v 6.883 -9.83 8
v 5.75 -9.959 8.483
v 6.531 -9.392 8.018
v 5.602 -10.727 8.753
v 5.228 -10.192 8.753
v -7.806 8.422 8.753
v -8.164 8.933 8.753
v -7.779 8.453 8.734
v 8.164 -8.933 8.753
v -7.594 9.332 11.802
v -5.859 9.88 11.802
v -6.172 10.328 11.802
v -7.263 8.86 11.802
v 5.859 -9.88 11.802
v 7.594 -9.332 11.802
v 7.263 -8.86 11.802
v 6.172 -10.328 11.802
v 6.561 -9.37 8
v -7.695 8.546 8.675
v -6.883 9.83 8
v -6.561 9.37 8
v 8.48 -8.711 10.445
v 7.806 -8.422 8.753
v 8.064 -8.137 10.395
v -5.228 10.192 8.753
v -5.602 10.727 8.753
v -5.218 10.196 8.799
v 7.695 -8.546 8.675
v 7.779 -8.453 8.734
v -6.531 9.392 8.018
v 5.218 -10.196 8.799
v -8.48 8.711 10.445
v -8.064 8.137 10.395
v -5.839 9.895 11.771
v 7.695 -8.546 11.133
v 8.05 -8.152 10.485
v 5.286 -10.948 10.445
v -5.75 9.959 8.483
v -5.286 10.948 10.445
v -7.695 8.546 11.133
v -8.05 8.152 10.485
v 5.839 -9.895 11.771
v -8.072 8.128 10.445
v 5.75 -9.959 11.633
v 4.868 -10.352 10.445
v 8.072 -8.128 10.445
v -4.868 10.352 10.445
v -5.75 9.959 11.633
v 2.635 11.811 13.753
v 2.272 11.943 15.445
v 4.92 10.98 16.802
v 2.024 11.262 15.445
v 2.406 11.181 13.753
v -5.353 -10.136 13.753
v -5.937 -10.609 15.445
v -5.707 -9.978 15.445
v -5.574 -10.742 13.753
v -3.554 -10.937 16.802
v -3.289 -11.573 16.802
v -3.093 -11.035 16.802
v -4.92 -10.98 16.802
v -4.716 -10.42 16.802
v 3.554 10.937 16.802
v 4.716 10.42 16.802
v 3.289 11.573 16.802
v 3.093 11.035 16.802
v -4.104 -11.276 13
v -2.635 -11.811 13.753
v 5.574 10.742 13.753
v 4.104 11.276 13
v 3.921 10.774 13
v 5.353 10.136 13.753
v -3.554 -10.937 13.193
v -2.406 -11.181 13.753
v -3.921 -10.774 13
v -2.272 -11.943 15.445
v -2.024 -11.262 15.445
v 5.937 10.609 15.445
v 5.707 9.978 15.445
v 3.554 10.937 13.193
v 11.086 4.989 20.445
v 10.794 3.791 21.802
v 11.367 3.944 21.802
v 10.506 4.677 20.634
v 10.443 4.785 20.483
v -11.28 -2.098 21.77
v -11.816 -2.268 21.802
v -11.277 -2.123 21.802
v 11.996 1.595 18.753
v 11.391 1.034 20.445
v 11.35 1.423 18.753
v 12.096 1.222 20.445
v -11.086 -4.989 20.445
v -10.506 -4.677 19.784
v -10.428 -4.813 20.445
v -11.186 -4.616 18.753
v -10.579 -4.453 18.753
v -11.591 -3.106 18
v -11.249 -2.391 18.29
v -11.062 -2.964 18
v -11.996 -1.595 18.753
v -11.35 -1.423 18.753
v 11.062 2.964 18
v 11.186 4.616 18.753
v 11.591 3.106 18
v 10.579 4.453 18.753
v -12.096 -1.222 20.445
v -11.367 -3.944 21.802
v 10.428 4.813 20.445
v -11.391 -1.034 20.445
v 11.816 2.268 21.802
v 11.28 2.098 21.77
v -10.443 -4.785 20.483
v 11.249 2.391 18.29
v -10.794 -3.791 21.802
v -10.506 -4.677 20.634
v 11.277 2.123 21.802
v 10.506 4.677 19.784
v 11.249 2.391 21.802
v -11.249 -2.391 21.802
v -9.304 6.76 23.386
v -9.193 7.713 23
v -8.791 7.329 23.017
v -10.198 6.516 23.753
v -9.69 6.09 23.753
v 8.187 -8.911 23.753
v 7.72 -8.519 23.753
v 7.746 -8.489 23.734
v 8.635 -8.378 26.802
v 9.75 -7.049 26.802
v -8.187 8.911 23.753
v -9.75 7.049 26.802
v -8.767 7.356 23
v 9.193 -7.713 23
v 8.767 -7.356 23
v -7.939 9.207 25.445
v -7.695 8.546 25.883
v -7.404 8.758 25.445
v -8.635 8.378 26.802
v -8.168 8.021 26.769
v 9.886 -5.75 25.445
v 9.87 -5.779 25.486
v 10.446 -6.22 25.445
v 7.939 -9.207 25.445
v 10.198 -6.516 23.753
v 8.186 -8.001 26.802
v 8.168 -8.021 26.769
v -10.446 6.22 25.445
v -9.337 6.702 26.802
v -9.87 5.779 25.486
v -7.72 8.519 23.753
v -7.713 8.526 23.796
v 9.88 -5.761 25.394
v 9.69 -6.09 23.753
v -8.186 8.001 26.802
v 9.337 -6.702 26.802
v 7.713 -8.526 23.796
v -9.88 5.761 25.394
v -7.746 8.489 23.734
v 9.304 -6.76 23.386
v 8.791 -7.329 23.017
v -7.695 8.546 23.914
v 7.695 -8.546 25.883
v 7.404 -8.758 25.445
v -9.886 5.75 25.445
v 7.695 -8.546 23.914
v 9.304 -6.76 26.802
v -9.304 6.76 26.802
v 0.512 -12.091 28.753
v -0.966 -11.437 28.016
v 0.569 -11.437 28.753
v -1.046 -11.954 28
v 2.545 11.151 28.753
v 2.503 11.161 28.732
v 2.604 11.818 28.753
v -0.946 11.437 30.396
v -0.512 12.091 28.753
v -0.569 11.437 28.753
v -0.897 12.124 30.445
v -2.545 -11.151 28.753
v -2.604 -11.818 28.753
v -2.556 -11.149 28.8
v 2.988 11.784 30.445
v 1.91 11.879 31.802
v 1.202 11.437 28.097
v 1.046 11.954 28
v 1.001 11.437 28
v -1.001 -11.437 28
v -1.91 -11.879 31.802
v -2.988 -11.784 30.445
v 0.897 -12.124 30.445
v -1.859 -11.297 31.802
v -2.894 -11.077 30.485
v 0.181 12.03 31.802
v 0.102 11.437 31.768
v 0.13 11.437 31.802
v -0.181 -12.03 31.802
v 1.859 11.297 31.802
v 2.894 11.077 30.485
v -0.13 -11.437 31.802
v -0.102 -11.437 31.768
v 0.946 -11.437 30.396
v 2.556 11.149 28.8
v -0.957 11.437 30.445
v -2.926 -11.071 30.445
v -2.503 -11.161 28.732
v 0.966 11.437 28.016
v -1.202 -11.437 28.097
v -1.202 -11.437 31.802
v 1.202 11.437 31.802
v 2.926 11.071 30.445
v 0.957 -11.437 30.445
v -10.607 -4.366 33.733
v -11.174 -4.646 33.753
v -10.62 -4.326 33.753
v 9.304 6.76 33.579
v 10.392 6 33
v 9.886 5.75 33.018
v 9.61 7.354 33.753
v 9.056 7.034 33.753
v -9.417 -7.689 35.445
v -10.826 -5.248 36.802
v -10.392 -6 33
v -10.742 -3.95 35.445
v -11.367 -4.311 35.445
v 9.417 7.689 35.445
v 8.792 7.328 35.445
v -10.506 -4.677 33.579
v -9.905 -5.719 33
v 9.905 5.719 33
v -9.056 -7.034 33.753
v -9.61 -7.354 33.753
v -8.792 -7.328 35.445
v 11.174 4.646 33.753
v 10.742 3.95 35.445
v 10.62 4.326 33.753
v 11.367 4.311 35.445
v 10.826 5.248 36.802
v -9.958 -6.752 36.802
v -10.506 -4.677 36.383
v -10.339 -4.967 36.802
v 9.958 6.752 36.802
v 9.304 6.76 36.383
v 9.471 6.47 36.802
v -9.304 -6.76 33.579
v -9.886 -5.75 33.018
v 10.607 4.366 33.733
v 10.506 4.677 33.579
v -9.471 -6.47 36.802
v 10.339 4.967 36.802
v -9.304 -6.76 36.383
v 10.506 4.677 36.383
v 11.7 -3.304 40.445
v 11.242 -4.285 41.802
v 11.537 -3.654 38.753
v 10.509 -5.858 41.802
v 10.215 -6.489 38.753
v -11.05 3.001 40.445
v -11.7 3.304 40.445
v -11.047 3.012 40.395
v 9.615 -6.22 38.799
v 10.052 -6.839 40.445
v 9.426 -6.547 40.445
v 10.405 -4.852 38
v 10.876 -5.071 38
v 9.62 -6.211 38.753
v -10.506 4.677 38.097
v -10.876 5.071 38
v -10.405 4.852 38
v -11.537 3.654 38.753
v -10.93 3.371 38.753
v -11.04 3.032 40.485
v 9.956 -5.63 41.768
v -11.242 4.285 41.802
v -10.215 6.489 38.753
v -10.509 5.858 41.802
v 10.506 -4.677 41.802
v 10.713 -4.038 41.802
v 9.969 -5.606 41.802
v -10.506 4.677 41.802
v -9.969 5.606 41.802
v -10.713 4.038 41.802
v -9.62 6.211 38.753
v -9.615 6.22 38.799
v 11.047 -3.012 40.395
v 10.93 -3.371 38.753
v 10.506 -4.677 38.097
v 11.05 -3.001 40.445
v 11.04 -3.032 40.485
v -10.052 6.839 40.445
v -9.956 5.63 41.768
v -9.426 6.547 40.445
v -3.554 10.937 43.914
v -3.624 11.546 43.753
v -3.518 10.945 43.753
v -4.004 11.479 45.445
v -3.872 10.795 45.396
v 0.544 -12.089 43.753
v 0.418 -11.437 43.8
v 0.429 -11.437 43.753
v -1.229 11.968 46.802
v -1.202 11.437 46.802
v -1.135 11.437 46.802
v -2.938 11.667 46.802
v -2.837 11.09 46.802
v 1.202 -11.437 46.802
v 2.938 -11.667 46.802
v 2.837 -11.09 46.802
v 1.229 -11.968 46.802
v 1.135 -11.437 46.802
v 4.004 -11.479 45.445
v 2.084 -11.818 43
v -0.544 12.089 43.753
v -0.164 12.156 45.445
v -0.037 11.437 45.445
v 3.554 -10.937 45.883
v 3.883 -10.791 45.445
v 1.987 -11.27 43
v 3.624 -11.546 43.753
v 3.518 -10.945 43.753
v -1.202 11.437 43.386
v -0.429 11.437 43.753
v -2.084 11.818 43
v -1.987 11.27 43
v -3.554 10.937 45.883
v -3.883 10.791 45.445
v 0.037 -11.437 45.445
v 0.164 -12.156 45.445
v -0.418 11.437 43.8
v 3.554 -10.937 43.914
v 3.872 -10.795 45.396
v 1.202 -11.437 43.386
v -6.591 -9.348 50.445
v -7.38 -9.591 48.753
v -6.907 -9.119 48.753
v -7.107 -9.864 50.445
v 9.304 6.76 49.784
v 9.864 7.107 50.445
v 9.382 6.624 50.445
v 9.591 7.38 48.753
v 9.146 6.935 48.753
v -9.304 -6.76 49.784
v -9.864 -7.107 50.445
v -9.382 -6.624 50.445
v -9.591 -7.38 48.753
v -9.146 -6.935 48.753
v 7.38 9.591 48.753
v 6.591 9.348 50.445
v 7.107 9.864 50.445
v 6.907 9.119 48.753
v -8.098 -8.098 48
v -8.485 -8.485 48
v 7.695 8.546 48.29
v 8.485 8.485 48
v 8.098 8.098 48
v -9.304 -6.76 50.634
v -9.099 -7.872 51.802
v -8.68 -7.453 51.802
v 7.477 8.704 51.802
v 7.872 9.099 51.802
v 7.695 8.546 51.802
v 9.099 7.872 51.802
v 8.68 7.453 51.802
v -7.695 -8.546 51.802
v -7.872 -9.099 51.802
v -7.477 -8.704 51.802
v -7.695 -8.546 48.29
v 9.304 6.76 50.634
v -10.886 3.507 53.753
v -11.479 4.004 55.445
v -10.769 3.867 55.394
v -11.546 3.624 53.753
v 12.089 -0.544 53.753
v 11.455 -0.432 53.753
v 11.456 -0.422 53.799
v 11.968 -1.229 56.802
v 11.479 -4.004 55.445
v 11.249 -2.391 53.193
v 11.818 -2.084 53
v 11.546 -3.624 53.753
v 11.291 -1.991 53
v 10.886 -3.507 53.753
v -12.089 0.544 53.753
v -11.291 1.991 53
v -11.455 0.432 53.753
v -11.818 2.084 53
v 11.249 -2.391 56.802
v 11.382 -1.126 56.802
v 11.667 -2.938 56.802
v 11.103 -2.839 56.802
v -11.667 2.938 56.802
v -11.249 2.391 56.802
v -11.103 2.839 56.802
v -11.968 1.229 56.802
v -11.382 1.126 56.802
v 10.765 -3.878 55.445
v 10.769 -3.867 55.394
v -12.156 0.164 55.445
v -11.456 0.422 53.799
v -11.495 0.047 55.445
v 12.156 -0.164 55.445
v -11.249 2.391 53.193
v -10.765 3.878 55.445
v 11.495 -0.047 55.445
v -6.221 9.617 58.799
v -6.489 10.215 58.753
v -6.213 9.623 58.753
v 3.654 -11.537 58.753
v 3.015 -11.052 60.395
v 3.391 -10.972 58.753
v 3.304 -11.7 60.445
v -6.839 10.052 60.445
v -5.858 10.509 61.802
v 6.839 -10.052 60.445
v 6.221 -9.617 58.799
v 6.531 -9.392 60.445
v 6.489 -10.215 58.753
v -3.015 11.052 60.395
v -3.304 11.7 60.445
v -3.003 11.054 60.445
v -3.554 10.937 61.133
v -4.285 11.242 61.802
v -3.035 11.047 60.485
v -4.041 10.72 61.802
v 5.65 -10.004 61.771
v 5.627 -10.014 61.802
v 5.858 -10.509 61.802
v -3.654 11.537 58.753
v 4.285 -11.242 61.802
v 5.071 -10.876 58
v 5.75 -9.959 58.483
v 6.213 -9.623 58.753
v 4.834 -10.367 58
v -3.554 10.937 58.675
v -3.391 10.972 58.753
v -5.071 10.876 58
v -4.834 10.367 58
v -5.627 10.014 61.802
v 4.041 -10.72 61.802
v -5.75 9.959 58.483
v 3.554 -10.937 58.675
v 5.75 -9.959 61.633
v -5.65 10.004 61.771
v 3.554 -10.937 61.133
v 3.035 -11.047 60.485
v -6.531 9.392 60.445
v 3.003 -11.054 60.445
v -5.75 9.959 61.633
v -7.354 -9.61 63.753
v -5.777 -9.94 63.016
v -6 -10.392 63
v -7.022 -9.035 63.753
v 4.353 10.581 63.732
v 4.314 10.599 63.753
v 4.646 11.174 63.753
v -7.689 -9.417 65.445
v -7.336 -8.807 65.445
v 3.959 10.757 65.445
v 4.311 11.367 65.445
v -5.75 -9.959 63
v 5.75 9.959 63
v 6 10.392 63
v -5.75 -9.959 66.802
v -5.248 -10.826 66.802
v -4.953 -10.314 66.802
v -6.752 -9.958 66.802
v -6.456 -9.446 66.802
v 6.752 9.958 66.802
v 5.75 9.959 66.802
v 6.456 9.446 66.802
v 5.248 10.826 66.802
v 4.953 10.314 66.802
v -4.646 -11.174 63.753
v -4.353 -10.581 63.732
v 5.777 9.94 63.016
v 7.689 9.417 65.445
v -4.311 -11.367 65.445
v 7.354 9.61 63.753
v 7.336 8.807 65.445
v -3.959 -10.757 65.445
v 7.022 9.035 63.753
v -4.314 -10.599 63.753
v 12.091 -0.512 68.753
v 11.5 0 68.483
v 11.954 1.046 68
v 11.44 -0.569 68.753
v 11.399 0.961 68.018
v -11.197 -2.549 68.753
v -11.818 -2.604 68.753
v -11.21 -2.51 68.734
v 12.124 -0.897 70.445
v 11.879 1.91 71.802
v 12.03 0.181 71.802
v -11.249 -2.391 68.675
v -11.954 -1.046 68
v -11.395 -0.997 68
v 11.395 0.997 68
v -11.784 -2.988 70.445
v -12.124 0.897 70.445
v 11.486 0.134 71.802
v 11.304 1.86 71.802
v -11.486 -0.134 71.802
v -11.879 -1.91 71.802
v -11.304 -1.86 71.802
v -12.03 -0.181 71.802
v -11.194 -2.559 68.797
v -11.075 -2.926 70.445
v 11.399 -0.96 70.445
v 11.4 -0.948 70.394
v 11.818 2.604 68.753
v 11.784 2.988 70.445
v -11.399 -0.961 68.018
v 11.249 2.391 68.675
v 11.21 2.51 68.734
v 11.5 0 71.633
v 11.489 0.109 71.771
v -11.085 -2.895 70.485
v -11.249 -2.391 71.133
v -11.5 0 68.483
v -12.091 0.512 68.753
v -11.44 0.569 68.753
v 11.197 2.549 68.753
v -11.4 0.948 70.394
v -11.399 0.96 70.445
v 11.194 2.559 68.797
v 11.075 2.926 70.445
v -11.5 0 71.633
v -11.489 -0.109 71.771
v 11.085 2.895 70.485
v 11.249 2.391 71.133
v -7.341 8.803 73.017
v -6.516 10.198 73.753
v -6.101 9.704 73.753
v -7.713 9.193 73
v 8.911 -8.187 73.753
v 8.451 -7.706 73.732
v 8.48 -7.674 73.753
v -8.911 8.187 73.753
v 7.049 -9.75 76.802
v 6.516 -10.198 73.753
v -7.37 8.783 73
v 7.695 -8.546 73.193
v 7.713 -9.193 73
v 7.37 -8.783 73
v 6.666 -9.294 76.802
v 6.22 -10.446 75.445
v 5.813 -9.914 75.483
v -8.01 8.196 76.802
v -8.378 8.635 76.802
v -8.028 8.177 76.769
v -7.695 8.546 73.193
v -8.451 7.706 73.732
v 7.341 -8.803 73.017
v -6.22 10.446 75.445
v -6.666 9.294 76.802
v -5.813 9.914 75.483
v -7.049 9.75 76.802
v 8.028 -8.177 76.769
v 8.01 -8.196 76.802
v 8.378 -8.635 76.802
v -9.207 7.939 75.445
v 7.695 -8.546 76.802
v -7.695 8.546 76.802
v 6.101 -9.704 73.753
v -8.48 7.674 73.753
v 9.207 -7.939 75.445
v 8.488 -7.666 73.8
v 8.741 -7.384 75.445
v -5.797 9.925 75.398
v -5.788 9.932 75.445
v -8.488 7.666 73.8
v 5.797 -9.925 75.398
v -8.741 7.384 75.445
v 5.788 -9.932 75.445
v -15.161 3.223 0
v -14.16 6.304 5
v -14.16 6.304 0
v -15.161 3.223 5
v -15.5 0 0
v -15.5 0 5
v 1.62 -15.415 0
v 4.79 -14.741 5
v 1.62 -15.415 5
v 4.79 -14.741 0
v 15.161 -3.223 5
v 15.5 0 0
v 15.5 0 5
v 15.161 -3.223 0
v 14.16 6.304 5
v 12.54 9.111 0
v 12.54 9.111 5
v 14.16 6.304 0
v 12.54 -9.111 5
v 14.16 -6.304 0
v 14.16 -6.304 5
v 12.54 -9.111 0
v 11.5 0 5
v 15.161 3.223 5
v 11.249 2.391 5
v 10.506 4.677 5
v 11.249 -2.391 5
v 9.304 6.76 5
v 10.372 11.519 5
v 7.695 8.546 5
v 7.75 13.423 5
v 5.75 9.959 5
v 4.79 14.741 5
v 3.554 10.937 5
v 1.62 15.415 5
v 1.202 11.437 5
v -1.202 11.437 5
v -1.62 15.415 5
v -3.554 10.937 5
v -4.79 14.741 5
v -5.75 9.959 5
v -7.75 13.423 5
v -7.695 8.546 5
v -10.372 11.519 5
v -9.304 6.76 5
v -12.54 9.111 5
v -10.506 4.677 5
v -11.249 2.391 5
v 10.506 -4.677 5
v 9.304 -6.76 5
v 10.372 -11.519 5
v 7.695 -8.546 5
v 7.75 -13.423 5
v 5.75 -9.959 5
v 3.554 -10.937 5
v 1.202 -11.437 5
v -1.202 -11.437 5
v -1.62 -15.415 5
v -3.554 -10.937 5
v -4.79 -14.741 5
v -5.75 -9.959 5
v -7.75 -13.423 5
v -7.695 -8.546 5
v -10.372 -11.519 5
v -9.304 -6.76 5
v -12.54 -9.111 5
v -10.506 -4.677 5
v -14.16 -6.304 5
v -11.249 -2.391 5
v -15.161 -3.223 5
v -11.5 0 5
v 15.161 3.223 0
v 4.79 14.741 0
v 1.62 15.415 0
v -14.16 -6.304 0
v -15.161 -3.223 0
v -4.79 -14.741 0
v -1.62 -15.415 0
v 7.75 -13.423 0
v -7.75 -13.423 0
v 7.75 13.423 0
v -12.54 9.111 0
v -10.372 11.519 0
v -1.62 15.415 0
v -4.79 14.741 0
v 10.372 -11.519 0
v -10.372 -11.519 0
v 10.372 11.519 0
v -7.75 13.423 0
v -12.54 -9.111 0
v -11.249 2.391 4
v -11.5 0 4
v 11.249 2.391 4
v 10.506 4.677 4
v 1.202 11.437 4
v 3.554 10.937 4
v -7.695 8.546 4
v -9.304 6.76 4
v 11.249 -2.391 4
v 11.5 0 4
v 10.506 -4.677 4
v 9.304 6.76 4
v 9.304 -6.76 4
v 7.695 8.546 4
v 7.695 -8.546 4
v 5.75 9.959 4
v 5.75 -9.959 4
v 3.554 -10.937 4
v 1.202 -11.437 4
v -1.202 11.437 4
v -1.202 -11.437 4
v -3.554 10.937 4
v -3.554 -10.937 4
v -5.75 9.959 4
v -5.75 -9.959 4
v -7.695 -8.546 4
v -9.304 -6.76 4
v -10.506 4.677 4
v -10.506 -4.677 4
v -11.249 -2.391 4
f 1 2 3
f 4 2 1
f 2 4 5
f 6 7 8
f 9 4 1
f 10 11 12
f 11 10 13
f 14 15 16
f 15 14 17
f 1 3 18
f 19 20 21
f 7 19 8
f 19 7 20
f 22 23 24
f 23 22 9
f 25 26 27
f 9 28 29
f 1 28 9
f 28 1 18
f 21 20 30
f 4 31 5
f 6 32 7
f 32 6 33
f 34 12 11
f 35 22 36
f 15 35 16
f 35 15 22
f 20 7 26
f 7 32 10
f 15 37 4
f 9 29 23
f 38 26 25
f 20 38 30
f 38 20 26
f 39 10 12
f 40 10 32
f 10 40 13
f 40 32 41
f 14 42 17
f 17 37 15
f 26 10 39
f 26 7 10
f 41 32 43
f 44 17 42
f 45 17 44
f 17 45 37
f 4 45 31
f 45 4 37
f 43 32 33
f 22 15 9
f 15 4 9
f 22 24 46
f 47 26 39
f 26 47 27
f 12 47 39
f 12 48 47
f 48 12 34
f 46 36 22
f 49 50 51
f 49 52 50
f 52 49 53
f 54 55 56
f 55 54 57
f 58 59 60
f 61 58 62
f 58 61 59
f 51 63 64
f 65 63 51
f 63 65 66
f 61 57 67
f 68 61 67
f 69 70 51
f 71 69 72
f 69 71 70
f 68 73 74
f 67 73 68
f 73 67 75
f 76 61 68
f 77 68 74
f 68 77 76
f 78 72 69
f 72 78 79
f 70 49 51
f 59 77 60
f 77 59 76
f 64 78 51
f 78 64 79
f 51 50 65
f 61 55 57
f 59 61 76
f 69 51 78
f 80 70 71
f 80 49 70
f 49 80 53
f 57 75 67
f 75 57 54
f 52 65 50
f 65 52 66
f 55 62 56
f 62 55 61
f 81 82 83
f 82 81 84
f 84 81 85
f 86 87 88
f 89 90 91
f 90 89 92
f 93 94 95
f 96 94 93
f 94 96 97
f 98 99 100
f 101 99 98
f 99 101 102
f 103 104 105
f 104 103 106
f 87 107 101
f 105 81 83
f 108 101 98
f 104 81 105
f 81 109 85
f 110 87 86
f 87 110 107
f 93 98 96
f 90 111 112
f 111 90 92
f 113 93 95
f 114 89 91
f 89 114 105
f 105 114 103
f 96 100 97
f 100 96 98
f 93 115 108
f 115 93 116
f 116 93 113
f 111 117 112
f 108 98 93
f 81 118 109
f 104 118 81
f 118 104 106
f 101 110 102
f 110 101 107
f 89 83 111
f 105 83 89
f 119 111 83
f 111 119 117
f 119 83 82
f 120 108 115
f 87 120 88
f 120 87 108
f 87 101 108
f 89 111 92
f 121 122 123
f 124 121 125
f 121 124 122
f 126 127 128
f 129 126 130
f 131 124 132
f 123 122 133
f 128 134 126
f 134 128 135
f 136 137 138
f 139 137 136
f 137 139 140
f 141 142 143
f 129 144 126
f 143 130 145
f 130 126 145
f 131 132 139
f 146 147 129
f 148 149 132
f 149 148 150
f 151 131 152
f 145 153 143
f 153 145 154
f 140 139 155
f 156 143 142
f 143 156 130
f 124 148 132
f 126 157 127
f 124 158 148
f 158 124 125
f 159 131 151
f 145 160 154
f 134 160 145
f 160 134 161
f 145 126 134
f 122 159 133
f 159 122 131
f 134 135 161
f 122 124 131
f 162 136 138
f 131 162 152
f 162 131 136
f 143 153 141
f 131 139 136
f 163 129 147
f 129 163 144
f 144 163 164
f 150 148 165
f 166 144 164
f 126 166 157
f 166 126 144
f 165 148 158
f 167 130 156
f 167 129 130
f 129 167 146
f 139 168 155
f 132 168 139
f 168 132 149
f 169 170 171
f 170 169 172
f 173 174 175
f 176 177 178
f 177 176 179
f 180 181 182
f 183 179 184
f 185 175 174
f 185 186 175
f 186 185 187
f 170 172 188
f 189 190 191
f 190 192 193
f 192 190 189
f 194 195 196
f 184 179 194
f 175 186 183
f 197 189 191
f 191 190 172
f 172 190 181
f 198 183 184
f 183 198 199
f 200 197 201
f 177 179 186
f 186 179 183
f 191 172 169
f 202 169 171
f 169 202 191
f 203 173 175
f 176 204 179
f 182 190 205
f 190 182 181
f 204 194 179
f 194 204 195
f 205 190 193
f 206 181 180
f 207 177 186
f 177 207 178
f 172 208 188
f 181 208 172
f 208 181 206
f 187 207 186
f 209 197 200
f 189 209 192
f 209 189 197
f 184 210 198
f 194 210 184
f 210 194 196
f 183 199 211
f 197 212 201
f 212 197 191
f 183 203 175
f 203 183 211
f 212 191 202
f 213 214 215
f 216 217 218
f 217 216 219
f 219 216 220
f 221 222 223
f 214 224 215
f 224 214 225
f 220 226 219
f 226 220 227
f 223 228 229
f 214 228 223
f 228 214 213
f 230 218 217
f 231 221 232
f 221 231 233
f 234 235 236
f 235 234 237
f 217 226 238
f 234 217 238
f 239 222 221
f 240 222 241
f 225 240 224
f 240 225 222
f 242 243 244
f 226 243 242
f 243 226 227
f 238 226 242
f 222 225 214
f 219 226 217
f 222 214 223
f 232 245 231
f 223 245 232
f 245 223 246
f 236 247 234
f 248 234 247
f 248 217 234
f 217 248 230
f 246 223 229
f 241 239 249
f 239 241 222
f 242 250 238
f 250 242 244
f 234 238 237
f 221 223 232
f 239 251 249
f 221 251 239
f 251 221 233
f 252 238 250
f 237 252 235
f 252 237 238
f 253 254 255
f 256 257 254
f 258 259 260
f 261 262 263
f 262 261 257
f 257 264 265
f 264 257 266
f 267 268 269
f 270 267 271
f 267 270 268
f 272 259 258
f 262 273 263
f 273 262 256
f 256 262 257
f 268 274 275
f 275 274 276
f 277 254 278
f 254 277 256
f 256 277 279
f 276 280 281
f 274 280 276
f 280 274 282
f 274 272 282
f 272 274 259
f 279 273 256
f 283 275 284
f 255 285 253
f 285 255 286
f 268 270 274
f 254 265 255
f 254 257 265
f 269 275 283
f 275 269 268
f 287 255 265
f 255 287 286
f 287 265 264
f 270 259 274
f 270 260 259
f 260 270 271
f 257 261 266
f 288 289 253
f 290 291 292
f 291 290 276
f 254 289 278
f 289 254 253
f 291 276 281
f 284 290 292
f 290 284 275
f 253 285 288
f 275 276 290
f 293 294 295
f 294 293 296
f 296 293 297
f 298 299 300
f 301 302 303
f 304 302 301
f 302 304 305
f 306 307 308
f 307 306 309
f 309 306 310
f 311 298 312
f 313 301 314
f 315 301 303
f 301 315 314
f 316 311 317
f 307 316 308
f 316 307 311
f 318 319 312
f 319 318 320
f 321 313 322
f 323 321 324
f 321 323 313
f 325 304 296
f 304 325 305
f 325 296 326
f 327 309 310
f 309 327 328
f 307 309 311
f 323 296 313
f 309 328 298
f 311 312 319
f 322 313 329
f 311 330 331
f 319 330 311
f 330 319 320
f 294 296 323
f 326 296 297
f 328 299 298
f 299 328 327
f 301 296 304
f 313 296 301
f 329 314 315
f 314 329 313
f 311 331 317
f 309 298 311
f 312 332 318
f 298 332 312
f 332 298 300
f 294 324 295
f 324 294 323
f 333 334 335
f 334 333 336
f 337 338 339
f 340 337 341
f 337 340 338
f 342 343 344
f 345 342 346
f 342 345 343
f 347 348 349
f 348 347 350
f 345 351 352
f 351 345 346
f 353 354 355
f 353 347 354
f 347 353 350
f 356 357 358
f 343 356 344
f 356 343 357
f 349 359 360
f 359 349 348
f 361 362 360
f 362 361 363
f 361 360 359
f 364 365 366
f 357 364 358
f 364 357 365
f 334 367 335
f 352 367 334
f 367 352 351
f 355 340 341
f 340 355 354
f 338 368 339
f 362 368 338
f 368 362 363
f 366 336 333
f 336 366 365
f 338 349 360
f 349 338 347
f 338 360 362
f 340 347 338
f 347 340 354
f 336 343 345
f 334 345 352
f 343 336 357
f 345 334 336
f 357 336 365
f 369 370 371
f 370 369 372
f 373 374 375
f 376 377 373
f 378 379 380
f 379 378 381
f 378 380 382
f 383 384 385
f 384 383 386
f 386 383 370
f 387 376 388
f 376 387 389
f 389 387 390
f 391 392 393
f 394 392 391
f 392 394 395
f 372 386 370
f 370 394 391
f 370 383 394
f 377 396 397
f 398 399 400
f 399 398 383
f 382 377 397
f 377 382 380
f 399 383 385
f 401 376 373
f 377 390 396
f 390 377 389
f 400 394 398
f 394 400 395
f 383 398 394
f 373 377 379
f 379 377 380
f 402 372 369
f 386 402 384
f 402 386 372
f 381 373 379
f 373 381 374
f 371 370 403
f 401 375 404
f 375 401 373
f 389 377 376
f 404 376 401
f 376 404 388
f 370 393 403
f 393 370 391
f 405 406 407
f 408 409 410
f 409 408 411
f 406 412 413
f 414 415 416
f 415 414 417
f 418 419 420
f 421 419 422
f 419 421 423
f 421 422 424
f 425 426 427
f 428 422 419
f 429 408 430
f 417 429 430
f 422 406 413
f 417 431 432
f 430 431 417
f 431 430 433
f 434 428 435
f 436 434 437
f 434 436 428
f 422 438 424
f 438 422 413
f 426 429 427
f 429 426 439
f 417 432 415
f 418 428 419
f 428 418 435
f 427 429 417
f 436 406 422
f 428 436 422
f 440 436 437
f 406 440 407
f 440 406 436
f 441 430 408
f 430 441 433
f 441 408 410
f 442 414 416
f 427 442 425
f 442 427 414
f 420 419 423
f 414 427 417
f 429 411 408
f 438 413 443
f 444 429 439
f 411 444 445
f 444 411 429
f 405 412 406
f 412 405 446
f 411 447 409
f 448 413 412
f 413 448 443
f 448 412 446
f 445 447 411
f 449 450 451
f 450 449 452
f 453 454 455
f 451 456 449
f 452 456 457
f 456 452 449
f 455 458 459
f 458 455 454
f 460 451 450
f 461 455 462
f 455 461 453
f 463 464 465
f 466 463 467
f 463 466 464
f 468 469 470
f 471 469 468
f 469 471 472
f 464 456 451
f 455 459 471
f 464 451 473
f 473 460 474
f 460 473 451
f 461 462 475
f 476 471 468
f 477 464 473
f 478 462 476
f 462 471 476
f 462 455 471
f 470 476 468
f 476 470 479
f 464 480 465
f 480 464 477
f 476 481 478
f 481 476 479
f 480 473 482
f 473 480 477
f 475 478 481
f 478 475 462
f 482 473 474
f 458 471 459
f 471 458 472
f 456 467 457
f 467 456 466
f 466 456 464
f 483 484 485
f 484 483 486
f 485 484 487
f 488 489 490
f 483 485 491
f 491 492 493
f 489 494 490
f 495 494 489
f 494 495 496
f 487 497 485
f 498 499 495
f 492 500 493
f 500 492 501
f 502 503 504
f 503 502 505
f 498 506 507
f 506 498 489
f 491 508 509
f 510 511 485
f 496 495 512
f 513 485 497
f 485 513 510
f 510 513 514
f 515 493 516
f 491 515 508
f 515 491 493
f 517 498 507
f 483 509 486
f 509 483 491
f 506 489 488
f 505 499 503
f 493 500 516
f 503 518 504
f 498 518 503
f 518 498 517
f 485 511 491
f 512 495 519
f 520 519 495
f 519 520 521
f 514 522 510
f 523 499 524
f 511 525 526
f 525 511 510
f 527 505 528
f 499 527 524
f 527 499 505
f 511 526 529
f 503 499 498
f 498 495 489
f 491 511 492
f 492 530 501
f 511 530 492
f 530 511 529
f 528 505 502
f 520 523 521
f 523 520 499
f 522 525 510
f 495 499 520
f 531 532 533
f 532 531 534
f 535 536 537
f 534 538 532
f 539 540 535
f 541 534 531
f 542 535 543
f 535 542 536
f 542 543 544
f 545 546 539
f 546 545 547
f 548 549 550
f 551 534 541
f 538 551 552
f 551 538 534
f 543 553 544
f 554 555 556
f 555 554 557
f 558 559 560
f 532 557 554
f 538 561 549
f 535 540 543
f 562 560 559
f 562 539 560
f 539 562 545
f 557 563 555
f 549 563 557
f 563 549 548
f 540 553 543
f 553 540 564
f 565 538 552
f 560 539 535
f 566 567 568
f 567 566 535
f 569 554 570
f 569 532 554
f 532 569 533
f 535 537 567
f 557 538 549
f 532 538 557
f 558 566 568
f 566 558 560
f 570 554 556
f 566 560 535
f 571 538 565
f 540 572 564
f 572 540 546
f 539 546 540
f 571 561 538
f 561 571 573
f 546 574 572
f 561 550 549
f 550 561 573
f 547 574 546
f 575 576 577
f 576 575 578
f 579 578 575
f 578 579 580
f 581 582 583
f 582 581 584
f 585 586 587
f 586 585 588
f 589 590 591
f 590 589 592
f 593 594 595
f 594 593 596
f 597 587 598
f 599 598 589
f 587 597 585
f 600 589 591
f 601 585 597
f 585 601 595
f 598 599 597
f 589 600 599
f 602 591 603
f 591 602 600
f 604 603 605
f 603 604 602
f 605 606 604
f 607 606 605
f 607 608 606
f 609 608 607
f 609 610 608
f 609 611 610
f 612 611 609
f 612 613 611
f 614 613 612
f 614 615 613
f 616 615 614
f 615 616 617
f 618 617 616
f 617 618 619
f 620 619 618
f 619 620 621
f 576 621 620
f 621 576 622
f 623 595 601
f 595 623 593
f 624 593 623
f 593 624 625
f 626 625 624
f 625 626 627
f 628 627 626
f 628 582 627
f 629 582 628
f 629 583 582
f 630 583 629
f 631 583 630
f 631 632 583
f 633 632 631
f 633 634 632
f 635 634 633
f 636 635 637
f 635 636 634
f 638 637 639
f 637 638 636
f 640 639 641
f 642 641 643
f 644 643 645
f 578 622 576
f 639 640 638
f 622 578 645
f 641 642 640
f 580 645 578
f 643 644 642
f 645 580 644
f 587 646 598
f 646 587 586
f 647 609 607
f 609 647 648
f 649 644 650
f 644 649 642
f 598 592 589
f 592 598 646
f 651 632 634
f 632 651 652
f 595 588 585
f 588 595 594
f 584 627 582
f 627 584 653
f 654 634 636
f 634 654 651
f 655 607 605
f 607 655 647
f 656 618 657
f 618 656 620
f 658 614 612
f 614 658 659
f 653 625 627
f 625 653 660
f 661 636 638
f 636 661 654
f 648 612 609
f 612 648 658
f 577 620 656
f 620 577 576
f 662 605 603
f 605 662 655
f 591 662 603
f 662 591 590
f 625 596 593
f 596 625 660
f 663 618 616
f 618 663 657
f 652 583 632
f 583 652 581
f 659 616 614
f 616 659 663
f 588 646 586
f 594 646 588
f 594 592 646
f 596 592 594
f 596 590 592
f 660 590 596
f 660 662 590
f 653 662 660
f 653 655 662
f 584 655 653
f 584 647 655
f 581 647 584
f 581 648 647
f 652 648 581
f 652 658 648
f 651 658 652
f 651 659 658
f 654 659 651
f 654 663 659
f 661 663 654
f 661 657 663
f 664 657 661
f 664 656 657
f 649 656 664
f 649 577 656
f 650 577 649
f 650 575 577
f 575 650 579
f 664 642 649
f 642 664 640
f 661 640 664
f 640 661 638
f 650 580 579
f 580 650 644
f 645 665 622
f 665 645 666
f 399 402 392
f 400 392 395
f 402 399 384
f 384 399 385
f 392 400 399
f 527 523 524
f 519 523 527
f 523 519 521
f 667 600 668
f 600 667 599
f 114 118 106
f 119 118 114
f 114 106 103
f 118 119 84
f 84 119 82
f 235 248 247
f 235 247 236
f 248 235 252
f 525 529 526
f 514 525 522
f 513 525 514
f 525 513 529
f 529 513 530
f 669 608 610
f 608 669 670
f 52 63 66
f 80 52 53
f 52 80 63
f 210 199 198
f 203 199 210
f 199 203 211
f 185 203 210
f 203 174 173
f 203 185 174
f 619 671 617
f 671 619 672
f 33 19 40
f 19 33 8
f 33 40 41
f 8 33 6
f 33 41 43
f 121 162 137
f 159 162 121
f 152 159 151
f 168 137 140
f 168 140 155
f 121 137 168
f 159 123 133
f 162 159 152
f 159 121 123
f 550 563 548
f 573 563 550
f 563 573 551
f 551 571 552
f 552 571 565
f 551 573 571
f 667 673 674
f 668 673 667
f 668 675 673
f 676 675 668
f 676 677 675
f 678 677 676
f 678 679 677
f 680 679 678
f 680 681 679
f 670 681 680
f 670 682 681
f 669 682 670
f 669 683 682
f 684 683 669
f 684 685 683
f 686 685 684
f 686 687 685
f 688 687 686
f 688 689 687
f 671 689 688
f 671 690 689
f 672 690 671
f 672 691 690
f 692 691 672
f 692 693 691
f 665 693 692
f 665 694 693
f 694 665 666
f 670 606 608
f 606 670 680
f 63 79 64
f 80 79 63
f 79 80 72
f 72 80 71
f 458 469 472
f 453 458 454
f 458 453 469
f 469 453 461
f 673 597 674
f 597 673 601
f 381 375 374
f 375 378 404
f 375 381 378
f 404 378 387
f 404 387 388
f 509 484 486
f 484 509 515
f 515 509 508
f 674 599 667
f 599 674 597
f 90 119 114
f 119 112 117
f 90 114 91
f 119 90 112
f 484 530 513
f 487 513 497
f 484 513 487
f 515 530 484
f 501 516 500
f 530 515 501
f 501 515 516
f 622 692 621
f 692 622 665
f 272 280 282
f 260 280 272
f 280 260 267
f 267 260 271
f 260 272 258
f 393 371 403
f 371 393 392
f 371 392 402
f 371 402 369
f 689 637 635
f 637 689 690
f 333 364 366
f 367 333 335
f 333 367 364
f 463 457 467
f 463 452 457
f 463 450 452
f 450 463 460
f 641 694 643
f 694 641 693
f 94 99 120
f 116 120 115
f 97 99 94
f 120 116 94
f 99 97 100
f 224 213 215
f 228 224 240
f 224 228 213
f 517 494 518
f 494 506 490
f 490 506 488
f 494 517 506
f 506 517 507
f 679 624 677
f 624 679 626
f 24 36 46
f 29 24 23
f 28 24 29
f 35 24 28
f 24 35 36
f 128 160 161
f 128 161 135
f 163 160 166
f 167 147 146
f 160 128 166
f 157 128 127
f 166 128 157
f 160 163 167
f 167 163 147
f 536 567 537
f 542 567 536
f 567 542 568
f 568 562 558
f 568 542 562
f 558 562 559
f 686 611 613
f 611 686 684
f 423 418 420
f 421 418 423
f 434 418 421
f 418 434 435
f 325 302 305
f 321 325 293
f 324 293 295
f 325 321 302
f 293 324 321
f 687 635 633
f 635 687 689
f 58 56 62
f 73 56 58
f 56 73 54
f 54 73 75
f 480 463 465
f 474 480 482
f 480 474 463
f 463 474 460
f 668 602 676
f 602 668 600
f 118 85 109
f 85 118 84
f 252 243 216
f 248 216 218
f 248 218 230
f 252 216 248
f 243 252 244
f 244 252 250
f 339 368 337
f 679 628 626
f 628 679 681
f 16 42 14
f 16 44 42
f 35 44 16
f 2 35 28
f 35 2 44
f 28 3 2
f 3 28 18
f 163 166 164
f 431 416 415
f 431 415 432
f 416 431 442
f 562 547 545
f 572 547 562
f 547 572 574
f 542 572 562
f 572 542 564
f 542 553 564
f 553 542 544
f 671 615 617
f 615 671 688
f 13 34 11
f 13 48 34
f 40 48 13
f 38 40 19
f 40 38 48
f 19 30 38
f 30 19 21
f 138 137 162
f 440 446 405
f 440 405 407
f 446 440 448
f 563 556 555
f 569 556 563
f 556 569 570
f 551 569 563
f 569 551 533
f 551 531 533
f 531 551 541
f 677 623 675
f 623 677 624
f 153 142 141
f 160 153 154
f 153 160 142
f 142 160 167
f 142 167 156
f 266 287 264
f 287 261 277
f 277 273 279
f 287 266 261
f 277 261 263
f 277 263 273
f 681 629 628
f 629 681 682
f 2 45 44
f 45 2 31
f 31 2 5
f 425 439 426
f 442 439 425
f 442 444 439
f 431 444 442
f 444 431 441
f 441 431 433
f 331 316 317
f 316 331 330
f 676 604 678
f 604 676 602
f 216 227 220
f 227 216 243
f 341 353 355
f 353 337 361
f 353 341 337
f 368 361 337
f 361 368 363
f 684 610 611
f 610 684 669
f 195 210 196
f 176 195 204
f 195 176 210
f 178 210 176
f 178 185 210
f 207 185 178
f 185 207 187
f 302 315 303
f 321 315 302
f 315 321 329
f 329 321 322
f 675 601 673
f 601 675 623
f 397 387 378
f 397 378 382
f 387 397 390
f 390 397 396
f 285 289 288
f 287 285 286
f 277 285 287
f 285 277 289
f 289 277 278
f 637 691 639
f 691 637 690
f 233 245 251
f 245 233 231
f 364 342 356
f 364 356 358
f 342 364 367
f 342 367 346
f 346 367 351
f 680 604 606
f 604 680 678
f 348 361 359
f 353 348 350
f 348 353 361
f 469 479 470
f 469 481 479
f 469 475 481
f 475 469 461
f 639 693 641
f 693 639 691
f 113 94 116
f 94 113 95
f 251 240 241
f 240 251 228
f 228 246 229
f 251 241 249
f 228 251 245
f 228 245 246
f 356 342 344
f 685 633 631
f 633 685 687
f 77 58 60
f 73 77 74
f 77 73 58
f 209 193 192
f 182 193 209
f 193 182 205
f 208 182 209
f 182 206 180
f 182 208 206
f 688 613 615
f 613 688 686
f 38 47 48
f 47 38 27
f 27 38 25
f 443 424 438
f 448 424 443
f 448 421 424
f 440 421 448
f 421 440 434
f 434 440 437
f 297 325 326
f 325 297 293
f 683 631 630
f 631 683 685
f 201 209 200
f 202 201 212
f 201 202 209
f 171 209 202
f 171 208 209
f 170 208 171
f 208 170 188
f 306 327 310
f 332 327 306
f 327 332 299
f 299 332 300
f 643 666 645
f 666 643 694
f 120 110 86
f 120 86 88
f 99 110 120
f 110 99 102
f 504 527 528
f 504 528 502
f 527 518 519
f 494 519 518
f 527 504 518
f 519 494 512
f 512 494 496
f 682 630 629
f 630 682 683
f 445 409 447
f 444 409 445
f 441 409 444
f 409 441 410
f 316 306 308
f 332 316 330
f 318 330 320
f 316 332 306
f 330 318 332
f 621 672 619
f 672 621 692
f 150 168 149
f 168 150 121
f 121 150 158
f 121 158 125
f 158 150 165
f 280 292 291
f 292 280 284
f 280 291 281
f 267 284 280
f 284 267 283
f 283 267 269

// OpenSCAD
// file: ../../../shapes/open-cylinder/open-cylinder.scad
// // TODO: Lower this to 50.
module openCylinder(height = 3,
                    outerRadius = 7,
                    innerRadius = 4.5,
                    fn = 100)
{
echo("hi oc");    
    $fn = fn;

    difference()
    {
        cylinder(r=outerRadius,
                 h=height);

        translate([0, 0, -1])
        cylinder(r=innerRadius,
                 h=height+1.01);
    }
}
// file: ../rainmaker.scad
use <../../shapes/open-cylinder/open-cylinder.scad>

module rainmaker(height = 140,
                 innerRadius = 30,
                 outerRadius = 34,
			 	 stepRadius = 2)
{
    union()
    {
        // the main shell
    	%
        openCylinder(height = height,
                     innerRadius = innerRadius,
                     outerRadius = outerRadius);

        bottomZ = 5;

        // the steps
        zStart = bottomZ;
        step_xLength = (innerRadius * 2) + 1;
        rainmaker_steps(height = height,
						stepRadius = stepRadius,
						step_xLength = step_xLength,
                        zStart = zStart);

        // the bottom
        cylinder(r=outerRadius, h=bottomZ);
    }
}

module rainmaker_steps(height,
						stepRadius,
						step_xLength,
						zStart)
{
    step = 5;

	zEnd = height - step - stepRadius;

    for(z = [zStart : step : zEnd])
    {
		xTranslate = 0;
        zTranslate = zStart + z;

//		zRotate = z * 5;
		zRotate = z * 25;

		for(s = [1 : 1 : 2])
		{
			if(s == 1)
			{
//				color("green")
		        translate([xTranslate, 0, zTranslate])
				rotate([0, 90, zRotate])
		        cylinder(r = stepRadius,
							h = step_xLength,
							center = true);
			}
		}
    }
}
// main file
use <../rainmaker.scad>


innerRadius = 11.5;

outerRadius = innerRadius + 4;

difference()
{

rainmaker(height = 80,
			innerRadius = innerRadius,
			outerRadius = outerRadius,
		  	rungsPerLevel = 5,
			shellDecoration = "bumps"

// this looks good for a 3 rung rainmaker
, zRotateAngle = 5

//TODO - remove
//, zDistanceBetweenRungs = 70
			);
    
    color("blue")
    translate([0,0,4])
    cylinder(r = innerRadius, h = 182);   
}
